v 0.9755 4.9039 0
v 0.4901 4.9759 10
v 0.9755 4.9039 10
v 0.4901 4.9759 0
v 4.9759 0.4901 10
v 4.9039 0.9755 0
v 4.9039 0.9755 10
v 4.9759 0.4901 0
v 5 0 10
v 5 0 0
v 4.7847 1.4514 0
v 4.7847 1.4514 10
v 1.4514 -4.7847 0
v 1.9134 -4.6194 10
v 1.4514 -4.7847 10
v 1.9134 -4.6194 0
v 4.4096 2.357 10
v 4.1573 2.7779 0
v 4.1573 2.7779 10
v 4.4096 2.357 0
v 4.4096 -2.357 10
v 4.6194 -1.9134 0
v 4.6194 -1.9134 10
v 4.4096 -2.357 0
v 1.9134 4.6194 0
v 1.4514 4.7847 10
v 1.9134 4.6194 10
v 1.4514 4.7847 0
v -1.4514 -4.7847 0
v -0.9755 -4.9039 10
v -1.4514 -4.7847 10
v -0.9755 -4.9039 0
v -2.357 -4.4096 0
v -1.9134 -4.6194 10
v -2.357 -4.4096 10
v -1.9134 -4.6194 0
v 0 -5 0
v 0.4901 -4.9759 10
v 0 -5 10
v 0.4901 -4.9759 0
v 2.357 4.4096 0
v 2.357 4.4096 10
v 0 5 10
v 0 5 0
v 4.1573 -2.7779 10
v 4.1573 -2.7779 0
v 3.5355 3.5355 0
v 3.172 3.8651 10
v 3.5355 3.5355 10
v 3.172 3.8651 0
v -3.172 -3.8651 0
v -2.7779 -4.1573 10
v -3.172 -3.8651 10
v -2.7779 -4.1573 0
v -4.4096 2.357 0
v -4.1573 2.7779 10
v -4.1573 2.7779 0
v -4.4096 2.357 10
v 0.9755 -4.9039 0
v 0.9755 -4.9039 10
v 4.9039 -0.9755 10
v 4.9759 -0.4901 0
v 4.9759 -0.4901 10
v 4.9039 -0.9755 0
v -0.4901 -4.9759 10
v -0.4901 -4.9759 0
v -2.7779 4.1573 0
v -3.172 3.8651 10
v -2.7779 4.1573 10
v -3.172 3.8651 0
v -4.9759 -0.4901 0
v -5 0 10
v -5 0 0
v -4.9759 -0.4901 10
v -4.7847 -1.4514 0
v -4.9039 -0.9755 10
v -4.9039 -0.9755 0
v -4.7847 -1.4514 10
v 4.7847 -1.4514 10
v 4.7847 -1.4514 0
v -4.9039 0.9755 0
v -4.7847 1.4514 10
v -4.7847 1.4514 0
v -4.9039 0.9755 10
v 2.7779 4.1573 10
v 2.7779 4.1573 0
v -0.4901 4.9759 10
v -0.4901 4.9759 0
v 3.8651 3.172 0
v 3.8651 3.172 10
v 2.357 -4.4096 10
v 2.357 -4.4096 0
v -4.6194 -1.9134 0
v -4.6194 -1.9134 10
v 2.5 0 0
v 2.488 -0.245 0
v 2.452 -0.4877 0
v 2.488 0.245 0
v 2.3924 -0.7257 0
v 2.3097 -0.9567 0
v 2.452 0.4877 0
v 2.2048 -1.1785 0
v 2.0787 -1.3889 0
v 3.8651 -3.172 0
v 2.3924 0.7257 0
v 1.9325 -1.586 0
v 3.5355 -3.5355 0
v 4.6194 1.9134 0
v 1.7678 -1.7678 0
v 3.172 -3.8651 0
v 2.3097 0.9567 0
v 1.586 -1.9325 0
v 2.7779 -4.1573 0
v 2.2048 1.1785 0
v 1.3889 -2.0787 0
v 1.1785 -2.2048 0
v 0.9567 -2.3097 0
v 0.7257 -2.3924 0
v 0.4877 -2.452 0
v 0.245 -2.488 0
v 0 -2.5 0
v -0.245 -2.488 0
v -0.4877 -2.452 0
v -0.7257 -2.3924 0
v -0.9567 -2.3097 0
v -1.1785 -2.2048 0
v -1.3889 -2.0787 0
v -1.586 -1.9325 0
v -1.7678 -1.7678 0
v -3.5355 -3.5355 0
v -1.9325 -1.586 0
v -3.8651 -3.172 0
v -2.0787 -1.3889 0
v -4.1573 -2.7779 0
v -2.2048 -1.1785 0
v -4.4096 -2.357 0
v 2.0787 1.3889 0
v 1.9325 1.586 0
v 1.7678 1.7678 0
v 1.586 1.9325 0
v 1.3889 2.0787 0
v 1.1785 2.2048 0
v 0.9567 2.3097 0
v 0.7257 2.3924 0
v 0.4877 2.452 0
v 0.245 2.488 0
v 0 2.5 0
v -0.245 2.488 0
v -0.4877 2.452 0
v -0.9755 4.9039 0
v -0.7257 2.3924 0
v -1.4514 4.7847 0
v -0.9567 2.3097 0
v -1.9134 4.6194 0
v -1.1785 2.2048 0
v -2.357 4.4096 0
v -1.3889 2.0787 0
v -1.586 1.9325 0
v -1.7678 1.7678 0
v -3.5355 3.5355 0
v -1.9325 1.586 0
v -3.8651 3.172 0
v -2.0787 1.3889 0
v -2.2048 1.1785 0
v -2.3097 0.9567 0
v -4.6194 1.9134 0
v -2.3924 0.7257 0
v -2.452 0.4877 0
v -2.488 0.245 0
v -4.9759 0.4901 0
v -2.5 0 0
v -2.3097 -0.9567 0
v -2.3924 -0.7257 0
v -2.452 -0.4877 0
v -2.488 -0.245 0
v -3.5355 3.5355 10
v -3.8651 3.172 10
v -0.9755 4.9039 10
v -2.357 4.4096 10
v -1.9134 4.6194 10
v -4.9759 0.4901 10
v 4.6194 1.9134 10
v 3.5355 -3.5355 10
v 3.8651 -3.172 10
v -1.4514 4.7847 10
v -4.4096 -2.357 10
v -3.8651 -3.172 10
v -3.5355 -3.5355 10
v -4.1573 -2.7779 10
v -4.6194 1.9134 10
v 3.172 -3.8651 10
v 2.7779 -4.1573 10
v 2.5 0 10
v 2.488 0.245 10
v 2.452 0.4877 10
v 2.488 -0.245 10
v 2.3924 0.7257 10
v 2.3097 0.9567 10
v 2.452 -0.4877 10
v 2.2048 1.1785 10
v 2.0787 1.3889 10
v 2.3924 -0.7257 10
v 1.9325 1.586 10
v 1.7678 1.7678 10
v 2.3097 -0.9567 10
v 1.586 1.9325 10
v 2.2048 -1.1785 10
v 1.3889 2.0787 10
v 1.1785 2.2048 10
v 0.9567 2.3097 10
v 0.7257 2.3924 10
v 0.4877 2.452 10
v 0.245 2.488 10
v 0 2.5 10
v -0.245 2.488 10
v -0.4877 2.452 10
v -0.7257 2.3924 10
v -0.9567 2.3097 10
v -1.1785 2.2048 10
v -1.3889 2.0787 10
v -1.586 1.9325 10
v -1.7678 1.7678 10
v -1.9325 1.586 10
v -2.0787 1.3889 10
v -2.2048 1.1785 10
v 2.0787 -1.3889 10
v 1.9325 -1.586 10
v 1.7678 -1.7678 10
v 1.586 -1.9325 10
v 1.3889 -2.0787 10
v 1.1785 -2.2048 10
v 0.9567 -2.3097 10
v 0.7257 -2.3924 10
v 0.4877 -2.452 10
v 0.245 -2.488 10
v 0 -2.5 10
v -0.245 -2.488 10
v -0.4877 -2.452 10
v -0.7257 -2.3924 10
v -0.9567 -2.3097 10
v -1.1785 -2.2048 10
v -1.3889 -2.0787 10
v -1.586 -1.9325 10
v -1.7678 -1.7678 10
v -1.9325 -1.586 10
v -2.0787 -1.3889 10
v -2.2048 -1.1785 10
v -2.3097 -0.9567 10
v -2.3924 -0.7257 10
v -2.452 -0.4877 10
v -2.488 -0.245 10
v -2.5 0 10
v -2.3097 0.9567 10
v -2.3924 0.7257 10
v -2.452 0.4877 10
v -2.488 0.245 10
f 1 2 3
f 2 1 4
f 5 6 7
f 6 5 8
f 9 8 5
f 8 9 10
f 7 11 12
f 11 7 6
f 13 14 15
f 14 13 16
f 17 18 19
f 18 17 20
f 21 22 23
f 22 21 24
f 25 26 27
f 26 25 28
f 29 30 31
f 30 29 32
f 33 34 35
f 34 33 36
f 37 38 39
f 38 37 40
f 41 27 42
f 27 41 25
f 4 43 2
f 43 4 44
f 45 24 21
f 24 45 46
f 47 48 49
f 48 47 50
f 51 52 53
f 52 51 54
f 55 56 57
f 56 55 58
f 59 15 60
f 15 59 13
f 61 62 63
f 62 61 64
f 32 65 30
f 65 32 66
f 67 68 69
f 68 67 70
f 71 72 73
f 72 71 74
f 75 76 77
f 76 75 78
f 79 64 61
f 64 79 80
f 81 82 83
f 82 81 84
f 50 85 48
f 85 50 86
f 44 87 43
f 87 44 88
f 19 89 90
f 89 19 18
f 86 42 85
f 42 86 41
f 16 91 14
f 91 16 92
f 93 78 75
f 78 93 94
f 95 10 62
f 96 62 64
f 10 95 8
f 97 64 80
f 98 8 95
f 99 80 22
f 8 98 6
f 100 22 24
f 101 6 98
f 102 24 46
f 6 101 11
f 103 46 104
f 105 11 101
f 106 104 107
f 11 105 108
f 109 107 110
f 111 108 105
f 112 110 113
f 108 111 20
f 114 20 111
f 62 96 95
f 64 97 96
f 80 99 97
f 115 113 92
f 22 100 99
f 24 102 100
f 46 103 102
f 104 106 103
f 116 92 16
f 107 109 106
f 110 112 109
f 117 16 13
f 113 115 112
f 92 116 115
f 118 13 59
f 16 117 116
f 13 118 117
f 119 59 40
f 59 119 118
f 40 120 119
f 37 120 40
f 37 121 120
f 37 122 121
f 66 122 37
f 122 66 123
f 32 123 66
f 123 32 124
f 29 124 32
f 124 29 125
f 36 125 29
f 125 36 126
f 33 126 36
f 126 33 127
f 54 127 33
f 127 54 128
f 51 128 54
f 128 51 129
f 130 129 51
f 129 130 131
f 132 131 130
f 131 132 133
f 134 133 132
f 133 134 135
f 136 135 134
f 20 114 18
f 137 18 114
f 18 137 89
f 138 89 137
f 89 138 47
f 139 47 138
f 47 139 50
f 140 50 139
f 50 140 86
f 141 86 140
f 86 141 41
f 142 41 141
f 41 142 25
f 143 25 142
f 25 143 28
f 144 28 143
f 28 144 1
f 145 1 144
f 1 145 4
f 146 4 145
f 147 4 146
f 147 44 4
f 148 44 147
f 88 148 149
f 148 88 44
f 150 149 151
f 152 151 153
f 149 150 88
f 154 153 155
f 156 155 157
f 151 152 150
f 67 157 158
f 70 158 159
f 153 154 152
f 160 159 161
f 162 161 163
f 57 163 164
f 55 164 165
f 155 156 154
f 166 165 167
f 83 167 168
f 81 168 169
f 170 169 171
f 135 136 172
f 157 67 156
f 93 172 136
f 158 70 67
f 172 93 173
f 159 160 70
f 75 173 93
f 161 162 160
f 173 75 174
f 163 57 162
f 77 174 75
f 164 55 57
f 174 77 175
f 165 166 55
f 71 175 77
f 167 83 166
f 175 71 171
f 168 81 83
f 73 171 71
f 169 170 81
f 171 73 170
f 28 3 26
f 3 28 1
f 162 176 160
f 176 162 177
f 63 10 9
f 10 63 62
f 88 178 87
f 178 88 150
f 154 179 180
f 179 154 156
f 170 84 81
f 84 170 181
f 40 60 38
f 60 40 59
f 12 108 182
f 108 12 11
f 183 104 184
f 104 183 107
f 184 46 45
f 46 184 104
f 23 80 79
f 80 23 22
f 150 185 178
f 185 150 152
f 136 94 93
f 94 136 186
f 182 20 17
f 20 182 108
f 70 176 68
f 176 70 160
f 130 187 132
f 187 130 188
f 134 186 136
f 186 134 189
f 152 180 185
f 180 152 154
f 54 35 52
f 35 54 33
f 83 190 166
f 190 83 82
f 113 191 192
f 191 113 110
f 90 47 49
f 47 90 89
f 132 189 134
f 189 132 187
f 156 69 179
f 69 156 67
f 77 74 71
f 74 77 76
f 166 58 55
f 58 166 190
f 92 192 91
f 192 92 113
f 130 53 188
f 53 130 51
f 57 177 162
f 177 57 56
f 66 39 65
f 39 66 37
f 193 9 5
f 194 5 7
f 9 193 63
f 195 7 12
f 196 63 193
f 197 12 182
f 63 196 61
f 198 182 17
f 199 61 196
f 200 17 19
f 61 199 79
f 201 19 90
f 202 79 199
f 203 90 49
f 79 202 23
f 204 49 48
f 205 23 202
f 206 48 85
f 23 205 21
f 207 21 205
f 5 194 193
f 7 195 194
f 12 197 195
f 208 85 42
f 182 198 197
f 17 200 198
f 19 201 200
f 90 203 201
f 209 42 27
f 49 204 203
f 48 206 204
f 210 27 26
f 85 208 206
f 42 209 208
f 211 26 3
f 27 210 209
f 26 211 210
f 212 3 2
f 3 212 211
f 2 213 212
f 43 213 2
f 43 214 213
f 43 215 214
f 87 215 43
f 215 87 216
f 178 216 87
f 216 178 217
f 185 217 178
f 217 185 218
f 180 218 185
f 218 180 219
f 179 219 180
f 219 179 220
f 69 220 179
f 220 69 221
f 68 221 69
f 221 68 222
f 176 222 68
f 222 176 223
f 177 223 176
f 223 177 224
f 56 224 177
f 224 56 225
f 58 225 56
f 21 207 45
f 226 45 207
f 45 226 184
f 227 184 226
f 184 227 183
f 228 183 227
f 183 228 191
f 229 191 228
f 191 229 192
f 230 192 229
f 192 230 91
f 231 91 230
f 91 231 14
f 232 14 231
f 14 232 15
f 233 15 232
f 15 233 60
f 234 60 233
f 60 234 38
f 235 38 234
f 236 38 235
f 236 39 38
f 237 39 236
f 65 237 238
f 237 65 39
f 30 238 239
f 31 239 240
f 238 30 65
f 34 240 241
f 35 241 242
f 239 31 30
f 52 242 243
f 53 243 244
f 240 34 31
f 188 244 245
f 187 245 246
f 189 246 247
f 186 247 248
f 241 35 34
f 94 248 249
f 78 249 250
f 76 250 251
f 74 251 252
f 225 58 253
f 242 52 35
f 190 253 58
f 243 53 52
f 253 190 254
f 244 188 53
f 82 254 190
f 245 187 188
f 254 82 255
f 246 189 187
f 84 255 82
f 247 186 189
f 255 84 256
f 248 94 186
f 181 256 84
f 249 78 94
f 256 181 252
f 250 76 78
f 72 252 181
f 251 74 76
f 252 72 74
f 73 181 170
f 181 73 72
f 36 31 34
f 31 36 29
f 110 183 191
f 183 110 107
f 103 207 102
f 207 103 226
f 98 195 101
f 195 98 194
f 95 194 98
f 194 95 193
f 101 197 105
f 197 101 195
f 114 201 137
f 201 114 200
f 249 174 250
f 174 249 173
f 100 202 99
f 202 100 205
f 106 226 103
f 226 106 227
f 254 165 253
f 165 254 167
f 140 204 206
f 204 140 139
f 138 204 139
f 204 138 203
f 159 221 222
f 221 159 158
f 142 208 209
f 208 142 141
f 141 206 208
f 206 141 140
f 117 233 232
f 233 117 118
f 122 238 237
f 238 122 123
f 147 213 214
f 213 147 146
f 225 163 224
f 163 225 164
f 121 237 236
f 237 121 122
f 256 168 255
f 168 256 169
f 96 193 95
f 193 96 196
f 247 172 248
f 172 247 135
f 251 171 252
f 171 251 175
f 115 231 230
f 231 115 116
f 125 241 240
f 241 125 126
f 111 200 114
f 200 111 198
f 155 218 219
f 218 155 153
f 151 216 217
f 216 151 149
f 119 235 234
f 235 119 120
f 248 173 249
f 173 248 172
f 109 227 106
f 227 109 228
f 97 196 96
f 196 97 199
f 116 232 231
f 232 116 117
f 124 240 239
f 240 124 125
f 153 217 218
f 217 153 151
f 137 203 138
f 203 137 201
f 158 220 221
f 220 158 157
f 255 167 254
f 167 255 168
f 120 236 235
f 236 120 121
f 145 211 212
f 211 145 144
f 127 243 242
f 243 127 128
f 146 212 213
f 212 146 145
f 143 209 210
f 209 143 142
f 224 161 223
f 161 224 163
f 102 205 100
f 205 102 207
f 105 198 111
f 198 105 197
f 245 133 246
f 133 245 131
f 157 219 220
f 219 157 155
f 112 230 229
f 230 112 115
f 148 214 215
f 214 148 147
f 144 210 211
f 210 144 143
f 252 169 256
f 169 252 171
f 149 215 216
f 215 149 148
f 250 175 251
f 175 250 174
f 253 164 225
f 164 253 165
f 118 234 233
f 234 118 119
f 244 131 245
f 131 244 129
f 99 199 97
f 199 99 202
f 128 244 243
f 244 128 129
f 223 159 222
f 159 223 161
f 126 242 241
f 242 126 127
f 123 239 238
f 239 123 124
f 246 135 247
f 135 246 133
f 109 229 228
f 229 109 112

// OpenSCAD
$fn=64;
difference() {
  cylinder(r=5,h=10);
  translate([0,0,-1]) cylinder(r=2.5,h=12);
}
